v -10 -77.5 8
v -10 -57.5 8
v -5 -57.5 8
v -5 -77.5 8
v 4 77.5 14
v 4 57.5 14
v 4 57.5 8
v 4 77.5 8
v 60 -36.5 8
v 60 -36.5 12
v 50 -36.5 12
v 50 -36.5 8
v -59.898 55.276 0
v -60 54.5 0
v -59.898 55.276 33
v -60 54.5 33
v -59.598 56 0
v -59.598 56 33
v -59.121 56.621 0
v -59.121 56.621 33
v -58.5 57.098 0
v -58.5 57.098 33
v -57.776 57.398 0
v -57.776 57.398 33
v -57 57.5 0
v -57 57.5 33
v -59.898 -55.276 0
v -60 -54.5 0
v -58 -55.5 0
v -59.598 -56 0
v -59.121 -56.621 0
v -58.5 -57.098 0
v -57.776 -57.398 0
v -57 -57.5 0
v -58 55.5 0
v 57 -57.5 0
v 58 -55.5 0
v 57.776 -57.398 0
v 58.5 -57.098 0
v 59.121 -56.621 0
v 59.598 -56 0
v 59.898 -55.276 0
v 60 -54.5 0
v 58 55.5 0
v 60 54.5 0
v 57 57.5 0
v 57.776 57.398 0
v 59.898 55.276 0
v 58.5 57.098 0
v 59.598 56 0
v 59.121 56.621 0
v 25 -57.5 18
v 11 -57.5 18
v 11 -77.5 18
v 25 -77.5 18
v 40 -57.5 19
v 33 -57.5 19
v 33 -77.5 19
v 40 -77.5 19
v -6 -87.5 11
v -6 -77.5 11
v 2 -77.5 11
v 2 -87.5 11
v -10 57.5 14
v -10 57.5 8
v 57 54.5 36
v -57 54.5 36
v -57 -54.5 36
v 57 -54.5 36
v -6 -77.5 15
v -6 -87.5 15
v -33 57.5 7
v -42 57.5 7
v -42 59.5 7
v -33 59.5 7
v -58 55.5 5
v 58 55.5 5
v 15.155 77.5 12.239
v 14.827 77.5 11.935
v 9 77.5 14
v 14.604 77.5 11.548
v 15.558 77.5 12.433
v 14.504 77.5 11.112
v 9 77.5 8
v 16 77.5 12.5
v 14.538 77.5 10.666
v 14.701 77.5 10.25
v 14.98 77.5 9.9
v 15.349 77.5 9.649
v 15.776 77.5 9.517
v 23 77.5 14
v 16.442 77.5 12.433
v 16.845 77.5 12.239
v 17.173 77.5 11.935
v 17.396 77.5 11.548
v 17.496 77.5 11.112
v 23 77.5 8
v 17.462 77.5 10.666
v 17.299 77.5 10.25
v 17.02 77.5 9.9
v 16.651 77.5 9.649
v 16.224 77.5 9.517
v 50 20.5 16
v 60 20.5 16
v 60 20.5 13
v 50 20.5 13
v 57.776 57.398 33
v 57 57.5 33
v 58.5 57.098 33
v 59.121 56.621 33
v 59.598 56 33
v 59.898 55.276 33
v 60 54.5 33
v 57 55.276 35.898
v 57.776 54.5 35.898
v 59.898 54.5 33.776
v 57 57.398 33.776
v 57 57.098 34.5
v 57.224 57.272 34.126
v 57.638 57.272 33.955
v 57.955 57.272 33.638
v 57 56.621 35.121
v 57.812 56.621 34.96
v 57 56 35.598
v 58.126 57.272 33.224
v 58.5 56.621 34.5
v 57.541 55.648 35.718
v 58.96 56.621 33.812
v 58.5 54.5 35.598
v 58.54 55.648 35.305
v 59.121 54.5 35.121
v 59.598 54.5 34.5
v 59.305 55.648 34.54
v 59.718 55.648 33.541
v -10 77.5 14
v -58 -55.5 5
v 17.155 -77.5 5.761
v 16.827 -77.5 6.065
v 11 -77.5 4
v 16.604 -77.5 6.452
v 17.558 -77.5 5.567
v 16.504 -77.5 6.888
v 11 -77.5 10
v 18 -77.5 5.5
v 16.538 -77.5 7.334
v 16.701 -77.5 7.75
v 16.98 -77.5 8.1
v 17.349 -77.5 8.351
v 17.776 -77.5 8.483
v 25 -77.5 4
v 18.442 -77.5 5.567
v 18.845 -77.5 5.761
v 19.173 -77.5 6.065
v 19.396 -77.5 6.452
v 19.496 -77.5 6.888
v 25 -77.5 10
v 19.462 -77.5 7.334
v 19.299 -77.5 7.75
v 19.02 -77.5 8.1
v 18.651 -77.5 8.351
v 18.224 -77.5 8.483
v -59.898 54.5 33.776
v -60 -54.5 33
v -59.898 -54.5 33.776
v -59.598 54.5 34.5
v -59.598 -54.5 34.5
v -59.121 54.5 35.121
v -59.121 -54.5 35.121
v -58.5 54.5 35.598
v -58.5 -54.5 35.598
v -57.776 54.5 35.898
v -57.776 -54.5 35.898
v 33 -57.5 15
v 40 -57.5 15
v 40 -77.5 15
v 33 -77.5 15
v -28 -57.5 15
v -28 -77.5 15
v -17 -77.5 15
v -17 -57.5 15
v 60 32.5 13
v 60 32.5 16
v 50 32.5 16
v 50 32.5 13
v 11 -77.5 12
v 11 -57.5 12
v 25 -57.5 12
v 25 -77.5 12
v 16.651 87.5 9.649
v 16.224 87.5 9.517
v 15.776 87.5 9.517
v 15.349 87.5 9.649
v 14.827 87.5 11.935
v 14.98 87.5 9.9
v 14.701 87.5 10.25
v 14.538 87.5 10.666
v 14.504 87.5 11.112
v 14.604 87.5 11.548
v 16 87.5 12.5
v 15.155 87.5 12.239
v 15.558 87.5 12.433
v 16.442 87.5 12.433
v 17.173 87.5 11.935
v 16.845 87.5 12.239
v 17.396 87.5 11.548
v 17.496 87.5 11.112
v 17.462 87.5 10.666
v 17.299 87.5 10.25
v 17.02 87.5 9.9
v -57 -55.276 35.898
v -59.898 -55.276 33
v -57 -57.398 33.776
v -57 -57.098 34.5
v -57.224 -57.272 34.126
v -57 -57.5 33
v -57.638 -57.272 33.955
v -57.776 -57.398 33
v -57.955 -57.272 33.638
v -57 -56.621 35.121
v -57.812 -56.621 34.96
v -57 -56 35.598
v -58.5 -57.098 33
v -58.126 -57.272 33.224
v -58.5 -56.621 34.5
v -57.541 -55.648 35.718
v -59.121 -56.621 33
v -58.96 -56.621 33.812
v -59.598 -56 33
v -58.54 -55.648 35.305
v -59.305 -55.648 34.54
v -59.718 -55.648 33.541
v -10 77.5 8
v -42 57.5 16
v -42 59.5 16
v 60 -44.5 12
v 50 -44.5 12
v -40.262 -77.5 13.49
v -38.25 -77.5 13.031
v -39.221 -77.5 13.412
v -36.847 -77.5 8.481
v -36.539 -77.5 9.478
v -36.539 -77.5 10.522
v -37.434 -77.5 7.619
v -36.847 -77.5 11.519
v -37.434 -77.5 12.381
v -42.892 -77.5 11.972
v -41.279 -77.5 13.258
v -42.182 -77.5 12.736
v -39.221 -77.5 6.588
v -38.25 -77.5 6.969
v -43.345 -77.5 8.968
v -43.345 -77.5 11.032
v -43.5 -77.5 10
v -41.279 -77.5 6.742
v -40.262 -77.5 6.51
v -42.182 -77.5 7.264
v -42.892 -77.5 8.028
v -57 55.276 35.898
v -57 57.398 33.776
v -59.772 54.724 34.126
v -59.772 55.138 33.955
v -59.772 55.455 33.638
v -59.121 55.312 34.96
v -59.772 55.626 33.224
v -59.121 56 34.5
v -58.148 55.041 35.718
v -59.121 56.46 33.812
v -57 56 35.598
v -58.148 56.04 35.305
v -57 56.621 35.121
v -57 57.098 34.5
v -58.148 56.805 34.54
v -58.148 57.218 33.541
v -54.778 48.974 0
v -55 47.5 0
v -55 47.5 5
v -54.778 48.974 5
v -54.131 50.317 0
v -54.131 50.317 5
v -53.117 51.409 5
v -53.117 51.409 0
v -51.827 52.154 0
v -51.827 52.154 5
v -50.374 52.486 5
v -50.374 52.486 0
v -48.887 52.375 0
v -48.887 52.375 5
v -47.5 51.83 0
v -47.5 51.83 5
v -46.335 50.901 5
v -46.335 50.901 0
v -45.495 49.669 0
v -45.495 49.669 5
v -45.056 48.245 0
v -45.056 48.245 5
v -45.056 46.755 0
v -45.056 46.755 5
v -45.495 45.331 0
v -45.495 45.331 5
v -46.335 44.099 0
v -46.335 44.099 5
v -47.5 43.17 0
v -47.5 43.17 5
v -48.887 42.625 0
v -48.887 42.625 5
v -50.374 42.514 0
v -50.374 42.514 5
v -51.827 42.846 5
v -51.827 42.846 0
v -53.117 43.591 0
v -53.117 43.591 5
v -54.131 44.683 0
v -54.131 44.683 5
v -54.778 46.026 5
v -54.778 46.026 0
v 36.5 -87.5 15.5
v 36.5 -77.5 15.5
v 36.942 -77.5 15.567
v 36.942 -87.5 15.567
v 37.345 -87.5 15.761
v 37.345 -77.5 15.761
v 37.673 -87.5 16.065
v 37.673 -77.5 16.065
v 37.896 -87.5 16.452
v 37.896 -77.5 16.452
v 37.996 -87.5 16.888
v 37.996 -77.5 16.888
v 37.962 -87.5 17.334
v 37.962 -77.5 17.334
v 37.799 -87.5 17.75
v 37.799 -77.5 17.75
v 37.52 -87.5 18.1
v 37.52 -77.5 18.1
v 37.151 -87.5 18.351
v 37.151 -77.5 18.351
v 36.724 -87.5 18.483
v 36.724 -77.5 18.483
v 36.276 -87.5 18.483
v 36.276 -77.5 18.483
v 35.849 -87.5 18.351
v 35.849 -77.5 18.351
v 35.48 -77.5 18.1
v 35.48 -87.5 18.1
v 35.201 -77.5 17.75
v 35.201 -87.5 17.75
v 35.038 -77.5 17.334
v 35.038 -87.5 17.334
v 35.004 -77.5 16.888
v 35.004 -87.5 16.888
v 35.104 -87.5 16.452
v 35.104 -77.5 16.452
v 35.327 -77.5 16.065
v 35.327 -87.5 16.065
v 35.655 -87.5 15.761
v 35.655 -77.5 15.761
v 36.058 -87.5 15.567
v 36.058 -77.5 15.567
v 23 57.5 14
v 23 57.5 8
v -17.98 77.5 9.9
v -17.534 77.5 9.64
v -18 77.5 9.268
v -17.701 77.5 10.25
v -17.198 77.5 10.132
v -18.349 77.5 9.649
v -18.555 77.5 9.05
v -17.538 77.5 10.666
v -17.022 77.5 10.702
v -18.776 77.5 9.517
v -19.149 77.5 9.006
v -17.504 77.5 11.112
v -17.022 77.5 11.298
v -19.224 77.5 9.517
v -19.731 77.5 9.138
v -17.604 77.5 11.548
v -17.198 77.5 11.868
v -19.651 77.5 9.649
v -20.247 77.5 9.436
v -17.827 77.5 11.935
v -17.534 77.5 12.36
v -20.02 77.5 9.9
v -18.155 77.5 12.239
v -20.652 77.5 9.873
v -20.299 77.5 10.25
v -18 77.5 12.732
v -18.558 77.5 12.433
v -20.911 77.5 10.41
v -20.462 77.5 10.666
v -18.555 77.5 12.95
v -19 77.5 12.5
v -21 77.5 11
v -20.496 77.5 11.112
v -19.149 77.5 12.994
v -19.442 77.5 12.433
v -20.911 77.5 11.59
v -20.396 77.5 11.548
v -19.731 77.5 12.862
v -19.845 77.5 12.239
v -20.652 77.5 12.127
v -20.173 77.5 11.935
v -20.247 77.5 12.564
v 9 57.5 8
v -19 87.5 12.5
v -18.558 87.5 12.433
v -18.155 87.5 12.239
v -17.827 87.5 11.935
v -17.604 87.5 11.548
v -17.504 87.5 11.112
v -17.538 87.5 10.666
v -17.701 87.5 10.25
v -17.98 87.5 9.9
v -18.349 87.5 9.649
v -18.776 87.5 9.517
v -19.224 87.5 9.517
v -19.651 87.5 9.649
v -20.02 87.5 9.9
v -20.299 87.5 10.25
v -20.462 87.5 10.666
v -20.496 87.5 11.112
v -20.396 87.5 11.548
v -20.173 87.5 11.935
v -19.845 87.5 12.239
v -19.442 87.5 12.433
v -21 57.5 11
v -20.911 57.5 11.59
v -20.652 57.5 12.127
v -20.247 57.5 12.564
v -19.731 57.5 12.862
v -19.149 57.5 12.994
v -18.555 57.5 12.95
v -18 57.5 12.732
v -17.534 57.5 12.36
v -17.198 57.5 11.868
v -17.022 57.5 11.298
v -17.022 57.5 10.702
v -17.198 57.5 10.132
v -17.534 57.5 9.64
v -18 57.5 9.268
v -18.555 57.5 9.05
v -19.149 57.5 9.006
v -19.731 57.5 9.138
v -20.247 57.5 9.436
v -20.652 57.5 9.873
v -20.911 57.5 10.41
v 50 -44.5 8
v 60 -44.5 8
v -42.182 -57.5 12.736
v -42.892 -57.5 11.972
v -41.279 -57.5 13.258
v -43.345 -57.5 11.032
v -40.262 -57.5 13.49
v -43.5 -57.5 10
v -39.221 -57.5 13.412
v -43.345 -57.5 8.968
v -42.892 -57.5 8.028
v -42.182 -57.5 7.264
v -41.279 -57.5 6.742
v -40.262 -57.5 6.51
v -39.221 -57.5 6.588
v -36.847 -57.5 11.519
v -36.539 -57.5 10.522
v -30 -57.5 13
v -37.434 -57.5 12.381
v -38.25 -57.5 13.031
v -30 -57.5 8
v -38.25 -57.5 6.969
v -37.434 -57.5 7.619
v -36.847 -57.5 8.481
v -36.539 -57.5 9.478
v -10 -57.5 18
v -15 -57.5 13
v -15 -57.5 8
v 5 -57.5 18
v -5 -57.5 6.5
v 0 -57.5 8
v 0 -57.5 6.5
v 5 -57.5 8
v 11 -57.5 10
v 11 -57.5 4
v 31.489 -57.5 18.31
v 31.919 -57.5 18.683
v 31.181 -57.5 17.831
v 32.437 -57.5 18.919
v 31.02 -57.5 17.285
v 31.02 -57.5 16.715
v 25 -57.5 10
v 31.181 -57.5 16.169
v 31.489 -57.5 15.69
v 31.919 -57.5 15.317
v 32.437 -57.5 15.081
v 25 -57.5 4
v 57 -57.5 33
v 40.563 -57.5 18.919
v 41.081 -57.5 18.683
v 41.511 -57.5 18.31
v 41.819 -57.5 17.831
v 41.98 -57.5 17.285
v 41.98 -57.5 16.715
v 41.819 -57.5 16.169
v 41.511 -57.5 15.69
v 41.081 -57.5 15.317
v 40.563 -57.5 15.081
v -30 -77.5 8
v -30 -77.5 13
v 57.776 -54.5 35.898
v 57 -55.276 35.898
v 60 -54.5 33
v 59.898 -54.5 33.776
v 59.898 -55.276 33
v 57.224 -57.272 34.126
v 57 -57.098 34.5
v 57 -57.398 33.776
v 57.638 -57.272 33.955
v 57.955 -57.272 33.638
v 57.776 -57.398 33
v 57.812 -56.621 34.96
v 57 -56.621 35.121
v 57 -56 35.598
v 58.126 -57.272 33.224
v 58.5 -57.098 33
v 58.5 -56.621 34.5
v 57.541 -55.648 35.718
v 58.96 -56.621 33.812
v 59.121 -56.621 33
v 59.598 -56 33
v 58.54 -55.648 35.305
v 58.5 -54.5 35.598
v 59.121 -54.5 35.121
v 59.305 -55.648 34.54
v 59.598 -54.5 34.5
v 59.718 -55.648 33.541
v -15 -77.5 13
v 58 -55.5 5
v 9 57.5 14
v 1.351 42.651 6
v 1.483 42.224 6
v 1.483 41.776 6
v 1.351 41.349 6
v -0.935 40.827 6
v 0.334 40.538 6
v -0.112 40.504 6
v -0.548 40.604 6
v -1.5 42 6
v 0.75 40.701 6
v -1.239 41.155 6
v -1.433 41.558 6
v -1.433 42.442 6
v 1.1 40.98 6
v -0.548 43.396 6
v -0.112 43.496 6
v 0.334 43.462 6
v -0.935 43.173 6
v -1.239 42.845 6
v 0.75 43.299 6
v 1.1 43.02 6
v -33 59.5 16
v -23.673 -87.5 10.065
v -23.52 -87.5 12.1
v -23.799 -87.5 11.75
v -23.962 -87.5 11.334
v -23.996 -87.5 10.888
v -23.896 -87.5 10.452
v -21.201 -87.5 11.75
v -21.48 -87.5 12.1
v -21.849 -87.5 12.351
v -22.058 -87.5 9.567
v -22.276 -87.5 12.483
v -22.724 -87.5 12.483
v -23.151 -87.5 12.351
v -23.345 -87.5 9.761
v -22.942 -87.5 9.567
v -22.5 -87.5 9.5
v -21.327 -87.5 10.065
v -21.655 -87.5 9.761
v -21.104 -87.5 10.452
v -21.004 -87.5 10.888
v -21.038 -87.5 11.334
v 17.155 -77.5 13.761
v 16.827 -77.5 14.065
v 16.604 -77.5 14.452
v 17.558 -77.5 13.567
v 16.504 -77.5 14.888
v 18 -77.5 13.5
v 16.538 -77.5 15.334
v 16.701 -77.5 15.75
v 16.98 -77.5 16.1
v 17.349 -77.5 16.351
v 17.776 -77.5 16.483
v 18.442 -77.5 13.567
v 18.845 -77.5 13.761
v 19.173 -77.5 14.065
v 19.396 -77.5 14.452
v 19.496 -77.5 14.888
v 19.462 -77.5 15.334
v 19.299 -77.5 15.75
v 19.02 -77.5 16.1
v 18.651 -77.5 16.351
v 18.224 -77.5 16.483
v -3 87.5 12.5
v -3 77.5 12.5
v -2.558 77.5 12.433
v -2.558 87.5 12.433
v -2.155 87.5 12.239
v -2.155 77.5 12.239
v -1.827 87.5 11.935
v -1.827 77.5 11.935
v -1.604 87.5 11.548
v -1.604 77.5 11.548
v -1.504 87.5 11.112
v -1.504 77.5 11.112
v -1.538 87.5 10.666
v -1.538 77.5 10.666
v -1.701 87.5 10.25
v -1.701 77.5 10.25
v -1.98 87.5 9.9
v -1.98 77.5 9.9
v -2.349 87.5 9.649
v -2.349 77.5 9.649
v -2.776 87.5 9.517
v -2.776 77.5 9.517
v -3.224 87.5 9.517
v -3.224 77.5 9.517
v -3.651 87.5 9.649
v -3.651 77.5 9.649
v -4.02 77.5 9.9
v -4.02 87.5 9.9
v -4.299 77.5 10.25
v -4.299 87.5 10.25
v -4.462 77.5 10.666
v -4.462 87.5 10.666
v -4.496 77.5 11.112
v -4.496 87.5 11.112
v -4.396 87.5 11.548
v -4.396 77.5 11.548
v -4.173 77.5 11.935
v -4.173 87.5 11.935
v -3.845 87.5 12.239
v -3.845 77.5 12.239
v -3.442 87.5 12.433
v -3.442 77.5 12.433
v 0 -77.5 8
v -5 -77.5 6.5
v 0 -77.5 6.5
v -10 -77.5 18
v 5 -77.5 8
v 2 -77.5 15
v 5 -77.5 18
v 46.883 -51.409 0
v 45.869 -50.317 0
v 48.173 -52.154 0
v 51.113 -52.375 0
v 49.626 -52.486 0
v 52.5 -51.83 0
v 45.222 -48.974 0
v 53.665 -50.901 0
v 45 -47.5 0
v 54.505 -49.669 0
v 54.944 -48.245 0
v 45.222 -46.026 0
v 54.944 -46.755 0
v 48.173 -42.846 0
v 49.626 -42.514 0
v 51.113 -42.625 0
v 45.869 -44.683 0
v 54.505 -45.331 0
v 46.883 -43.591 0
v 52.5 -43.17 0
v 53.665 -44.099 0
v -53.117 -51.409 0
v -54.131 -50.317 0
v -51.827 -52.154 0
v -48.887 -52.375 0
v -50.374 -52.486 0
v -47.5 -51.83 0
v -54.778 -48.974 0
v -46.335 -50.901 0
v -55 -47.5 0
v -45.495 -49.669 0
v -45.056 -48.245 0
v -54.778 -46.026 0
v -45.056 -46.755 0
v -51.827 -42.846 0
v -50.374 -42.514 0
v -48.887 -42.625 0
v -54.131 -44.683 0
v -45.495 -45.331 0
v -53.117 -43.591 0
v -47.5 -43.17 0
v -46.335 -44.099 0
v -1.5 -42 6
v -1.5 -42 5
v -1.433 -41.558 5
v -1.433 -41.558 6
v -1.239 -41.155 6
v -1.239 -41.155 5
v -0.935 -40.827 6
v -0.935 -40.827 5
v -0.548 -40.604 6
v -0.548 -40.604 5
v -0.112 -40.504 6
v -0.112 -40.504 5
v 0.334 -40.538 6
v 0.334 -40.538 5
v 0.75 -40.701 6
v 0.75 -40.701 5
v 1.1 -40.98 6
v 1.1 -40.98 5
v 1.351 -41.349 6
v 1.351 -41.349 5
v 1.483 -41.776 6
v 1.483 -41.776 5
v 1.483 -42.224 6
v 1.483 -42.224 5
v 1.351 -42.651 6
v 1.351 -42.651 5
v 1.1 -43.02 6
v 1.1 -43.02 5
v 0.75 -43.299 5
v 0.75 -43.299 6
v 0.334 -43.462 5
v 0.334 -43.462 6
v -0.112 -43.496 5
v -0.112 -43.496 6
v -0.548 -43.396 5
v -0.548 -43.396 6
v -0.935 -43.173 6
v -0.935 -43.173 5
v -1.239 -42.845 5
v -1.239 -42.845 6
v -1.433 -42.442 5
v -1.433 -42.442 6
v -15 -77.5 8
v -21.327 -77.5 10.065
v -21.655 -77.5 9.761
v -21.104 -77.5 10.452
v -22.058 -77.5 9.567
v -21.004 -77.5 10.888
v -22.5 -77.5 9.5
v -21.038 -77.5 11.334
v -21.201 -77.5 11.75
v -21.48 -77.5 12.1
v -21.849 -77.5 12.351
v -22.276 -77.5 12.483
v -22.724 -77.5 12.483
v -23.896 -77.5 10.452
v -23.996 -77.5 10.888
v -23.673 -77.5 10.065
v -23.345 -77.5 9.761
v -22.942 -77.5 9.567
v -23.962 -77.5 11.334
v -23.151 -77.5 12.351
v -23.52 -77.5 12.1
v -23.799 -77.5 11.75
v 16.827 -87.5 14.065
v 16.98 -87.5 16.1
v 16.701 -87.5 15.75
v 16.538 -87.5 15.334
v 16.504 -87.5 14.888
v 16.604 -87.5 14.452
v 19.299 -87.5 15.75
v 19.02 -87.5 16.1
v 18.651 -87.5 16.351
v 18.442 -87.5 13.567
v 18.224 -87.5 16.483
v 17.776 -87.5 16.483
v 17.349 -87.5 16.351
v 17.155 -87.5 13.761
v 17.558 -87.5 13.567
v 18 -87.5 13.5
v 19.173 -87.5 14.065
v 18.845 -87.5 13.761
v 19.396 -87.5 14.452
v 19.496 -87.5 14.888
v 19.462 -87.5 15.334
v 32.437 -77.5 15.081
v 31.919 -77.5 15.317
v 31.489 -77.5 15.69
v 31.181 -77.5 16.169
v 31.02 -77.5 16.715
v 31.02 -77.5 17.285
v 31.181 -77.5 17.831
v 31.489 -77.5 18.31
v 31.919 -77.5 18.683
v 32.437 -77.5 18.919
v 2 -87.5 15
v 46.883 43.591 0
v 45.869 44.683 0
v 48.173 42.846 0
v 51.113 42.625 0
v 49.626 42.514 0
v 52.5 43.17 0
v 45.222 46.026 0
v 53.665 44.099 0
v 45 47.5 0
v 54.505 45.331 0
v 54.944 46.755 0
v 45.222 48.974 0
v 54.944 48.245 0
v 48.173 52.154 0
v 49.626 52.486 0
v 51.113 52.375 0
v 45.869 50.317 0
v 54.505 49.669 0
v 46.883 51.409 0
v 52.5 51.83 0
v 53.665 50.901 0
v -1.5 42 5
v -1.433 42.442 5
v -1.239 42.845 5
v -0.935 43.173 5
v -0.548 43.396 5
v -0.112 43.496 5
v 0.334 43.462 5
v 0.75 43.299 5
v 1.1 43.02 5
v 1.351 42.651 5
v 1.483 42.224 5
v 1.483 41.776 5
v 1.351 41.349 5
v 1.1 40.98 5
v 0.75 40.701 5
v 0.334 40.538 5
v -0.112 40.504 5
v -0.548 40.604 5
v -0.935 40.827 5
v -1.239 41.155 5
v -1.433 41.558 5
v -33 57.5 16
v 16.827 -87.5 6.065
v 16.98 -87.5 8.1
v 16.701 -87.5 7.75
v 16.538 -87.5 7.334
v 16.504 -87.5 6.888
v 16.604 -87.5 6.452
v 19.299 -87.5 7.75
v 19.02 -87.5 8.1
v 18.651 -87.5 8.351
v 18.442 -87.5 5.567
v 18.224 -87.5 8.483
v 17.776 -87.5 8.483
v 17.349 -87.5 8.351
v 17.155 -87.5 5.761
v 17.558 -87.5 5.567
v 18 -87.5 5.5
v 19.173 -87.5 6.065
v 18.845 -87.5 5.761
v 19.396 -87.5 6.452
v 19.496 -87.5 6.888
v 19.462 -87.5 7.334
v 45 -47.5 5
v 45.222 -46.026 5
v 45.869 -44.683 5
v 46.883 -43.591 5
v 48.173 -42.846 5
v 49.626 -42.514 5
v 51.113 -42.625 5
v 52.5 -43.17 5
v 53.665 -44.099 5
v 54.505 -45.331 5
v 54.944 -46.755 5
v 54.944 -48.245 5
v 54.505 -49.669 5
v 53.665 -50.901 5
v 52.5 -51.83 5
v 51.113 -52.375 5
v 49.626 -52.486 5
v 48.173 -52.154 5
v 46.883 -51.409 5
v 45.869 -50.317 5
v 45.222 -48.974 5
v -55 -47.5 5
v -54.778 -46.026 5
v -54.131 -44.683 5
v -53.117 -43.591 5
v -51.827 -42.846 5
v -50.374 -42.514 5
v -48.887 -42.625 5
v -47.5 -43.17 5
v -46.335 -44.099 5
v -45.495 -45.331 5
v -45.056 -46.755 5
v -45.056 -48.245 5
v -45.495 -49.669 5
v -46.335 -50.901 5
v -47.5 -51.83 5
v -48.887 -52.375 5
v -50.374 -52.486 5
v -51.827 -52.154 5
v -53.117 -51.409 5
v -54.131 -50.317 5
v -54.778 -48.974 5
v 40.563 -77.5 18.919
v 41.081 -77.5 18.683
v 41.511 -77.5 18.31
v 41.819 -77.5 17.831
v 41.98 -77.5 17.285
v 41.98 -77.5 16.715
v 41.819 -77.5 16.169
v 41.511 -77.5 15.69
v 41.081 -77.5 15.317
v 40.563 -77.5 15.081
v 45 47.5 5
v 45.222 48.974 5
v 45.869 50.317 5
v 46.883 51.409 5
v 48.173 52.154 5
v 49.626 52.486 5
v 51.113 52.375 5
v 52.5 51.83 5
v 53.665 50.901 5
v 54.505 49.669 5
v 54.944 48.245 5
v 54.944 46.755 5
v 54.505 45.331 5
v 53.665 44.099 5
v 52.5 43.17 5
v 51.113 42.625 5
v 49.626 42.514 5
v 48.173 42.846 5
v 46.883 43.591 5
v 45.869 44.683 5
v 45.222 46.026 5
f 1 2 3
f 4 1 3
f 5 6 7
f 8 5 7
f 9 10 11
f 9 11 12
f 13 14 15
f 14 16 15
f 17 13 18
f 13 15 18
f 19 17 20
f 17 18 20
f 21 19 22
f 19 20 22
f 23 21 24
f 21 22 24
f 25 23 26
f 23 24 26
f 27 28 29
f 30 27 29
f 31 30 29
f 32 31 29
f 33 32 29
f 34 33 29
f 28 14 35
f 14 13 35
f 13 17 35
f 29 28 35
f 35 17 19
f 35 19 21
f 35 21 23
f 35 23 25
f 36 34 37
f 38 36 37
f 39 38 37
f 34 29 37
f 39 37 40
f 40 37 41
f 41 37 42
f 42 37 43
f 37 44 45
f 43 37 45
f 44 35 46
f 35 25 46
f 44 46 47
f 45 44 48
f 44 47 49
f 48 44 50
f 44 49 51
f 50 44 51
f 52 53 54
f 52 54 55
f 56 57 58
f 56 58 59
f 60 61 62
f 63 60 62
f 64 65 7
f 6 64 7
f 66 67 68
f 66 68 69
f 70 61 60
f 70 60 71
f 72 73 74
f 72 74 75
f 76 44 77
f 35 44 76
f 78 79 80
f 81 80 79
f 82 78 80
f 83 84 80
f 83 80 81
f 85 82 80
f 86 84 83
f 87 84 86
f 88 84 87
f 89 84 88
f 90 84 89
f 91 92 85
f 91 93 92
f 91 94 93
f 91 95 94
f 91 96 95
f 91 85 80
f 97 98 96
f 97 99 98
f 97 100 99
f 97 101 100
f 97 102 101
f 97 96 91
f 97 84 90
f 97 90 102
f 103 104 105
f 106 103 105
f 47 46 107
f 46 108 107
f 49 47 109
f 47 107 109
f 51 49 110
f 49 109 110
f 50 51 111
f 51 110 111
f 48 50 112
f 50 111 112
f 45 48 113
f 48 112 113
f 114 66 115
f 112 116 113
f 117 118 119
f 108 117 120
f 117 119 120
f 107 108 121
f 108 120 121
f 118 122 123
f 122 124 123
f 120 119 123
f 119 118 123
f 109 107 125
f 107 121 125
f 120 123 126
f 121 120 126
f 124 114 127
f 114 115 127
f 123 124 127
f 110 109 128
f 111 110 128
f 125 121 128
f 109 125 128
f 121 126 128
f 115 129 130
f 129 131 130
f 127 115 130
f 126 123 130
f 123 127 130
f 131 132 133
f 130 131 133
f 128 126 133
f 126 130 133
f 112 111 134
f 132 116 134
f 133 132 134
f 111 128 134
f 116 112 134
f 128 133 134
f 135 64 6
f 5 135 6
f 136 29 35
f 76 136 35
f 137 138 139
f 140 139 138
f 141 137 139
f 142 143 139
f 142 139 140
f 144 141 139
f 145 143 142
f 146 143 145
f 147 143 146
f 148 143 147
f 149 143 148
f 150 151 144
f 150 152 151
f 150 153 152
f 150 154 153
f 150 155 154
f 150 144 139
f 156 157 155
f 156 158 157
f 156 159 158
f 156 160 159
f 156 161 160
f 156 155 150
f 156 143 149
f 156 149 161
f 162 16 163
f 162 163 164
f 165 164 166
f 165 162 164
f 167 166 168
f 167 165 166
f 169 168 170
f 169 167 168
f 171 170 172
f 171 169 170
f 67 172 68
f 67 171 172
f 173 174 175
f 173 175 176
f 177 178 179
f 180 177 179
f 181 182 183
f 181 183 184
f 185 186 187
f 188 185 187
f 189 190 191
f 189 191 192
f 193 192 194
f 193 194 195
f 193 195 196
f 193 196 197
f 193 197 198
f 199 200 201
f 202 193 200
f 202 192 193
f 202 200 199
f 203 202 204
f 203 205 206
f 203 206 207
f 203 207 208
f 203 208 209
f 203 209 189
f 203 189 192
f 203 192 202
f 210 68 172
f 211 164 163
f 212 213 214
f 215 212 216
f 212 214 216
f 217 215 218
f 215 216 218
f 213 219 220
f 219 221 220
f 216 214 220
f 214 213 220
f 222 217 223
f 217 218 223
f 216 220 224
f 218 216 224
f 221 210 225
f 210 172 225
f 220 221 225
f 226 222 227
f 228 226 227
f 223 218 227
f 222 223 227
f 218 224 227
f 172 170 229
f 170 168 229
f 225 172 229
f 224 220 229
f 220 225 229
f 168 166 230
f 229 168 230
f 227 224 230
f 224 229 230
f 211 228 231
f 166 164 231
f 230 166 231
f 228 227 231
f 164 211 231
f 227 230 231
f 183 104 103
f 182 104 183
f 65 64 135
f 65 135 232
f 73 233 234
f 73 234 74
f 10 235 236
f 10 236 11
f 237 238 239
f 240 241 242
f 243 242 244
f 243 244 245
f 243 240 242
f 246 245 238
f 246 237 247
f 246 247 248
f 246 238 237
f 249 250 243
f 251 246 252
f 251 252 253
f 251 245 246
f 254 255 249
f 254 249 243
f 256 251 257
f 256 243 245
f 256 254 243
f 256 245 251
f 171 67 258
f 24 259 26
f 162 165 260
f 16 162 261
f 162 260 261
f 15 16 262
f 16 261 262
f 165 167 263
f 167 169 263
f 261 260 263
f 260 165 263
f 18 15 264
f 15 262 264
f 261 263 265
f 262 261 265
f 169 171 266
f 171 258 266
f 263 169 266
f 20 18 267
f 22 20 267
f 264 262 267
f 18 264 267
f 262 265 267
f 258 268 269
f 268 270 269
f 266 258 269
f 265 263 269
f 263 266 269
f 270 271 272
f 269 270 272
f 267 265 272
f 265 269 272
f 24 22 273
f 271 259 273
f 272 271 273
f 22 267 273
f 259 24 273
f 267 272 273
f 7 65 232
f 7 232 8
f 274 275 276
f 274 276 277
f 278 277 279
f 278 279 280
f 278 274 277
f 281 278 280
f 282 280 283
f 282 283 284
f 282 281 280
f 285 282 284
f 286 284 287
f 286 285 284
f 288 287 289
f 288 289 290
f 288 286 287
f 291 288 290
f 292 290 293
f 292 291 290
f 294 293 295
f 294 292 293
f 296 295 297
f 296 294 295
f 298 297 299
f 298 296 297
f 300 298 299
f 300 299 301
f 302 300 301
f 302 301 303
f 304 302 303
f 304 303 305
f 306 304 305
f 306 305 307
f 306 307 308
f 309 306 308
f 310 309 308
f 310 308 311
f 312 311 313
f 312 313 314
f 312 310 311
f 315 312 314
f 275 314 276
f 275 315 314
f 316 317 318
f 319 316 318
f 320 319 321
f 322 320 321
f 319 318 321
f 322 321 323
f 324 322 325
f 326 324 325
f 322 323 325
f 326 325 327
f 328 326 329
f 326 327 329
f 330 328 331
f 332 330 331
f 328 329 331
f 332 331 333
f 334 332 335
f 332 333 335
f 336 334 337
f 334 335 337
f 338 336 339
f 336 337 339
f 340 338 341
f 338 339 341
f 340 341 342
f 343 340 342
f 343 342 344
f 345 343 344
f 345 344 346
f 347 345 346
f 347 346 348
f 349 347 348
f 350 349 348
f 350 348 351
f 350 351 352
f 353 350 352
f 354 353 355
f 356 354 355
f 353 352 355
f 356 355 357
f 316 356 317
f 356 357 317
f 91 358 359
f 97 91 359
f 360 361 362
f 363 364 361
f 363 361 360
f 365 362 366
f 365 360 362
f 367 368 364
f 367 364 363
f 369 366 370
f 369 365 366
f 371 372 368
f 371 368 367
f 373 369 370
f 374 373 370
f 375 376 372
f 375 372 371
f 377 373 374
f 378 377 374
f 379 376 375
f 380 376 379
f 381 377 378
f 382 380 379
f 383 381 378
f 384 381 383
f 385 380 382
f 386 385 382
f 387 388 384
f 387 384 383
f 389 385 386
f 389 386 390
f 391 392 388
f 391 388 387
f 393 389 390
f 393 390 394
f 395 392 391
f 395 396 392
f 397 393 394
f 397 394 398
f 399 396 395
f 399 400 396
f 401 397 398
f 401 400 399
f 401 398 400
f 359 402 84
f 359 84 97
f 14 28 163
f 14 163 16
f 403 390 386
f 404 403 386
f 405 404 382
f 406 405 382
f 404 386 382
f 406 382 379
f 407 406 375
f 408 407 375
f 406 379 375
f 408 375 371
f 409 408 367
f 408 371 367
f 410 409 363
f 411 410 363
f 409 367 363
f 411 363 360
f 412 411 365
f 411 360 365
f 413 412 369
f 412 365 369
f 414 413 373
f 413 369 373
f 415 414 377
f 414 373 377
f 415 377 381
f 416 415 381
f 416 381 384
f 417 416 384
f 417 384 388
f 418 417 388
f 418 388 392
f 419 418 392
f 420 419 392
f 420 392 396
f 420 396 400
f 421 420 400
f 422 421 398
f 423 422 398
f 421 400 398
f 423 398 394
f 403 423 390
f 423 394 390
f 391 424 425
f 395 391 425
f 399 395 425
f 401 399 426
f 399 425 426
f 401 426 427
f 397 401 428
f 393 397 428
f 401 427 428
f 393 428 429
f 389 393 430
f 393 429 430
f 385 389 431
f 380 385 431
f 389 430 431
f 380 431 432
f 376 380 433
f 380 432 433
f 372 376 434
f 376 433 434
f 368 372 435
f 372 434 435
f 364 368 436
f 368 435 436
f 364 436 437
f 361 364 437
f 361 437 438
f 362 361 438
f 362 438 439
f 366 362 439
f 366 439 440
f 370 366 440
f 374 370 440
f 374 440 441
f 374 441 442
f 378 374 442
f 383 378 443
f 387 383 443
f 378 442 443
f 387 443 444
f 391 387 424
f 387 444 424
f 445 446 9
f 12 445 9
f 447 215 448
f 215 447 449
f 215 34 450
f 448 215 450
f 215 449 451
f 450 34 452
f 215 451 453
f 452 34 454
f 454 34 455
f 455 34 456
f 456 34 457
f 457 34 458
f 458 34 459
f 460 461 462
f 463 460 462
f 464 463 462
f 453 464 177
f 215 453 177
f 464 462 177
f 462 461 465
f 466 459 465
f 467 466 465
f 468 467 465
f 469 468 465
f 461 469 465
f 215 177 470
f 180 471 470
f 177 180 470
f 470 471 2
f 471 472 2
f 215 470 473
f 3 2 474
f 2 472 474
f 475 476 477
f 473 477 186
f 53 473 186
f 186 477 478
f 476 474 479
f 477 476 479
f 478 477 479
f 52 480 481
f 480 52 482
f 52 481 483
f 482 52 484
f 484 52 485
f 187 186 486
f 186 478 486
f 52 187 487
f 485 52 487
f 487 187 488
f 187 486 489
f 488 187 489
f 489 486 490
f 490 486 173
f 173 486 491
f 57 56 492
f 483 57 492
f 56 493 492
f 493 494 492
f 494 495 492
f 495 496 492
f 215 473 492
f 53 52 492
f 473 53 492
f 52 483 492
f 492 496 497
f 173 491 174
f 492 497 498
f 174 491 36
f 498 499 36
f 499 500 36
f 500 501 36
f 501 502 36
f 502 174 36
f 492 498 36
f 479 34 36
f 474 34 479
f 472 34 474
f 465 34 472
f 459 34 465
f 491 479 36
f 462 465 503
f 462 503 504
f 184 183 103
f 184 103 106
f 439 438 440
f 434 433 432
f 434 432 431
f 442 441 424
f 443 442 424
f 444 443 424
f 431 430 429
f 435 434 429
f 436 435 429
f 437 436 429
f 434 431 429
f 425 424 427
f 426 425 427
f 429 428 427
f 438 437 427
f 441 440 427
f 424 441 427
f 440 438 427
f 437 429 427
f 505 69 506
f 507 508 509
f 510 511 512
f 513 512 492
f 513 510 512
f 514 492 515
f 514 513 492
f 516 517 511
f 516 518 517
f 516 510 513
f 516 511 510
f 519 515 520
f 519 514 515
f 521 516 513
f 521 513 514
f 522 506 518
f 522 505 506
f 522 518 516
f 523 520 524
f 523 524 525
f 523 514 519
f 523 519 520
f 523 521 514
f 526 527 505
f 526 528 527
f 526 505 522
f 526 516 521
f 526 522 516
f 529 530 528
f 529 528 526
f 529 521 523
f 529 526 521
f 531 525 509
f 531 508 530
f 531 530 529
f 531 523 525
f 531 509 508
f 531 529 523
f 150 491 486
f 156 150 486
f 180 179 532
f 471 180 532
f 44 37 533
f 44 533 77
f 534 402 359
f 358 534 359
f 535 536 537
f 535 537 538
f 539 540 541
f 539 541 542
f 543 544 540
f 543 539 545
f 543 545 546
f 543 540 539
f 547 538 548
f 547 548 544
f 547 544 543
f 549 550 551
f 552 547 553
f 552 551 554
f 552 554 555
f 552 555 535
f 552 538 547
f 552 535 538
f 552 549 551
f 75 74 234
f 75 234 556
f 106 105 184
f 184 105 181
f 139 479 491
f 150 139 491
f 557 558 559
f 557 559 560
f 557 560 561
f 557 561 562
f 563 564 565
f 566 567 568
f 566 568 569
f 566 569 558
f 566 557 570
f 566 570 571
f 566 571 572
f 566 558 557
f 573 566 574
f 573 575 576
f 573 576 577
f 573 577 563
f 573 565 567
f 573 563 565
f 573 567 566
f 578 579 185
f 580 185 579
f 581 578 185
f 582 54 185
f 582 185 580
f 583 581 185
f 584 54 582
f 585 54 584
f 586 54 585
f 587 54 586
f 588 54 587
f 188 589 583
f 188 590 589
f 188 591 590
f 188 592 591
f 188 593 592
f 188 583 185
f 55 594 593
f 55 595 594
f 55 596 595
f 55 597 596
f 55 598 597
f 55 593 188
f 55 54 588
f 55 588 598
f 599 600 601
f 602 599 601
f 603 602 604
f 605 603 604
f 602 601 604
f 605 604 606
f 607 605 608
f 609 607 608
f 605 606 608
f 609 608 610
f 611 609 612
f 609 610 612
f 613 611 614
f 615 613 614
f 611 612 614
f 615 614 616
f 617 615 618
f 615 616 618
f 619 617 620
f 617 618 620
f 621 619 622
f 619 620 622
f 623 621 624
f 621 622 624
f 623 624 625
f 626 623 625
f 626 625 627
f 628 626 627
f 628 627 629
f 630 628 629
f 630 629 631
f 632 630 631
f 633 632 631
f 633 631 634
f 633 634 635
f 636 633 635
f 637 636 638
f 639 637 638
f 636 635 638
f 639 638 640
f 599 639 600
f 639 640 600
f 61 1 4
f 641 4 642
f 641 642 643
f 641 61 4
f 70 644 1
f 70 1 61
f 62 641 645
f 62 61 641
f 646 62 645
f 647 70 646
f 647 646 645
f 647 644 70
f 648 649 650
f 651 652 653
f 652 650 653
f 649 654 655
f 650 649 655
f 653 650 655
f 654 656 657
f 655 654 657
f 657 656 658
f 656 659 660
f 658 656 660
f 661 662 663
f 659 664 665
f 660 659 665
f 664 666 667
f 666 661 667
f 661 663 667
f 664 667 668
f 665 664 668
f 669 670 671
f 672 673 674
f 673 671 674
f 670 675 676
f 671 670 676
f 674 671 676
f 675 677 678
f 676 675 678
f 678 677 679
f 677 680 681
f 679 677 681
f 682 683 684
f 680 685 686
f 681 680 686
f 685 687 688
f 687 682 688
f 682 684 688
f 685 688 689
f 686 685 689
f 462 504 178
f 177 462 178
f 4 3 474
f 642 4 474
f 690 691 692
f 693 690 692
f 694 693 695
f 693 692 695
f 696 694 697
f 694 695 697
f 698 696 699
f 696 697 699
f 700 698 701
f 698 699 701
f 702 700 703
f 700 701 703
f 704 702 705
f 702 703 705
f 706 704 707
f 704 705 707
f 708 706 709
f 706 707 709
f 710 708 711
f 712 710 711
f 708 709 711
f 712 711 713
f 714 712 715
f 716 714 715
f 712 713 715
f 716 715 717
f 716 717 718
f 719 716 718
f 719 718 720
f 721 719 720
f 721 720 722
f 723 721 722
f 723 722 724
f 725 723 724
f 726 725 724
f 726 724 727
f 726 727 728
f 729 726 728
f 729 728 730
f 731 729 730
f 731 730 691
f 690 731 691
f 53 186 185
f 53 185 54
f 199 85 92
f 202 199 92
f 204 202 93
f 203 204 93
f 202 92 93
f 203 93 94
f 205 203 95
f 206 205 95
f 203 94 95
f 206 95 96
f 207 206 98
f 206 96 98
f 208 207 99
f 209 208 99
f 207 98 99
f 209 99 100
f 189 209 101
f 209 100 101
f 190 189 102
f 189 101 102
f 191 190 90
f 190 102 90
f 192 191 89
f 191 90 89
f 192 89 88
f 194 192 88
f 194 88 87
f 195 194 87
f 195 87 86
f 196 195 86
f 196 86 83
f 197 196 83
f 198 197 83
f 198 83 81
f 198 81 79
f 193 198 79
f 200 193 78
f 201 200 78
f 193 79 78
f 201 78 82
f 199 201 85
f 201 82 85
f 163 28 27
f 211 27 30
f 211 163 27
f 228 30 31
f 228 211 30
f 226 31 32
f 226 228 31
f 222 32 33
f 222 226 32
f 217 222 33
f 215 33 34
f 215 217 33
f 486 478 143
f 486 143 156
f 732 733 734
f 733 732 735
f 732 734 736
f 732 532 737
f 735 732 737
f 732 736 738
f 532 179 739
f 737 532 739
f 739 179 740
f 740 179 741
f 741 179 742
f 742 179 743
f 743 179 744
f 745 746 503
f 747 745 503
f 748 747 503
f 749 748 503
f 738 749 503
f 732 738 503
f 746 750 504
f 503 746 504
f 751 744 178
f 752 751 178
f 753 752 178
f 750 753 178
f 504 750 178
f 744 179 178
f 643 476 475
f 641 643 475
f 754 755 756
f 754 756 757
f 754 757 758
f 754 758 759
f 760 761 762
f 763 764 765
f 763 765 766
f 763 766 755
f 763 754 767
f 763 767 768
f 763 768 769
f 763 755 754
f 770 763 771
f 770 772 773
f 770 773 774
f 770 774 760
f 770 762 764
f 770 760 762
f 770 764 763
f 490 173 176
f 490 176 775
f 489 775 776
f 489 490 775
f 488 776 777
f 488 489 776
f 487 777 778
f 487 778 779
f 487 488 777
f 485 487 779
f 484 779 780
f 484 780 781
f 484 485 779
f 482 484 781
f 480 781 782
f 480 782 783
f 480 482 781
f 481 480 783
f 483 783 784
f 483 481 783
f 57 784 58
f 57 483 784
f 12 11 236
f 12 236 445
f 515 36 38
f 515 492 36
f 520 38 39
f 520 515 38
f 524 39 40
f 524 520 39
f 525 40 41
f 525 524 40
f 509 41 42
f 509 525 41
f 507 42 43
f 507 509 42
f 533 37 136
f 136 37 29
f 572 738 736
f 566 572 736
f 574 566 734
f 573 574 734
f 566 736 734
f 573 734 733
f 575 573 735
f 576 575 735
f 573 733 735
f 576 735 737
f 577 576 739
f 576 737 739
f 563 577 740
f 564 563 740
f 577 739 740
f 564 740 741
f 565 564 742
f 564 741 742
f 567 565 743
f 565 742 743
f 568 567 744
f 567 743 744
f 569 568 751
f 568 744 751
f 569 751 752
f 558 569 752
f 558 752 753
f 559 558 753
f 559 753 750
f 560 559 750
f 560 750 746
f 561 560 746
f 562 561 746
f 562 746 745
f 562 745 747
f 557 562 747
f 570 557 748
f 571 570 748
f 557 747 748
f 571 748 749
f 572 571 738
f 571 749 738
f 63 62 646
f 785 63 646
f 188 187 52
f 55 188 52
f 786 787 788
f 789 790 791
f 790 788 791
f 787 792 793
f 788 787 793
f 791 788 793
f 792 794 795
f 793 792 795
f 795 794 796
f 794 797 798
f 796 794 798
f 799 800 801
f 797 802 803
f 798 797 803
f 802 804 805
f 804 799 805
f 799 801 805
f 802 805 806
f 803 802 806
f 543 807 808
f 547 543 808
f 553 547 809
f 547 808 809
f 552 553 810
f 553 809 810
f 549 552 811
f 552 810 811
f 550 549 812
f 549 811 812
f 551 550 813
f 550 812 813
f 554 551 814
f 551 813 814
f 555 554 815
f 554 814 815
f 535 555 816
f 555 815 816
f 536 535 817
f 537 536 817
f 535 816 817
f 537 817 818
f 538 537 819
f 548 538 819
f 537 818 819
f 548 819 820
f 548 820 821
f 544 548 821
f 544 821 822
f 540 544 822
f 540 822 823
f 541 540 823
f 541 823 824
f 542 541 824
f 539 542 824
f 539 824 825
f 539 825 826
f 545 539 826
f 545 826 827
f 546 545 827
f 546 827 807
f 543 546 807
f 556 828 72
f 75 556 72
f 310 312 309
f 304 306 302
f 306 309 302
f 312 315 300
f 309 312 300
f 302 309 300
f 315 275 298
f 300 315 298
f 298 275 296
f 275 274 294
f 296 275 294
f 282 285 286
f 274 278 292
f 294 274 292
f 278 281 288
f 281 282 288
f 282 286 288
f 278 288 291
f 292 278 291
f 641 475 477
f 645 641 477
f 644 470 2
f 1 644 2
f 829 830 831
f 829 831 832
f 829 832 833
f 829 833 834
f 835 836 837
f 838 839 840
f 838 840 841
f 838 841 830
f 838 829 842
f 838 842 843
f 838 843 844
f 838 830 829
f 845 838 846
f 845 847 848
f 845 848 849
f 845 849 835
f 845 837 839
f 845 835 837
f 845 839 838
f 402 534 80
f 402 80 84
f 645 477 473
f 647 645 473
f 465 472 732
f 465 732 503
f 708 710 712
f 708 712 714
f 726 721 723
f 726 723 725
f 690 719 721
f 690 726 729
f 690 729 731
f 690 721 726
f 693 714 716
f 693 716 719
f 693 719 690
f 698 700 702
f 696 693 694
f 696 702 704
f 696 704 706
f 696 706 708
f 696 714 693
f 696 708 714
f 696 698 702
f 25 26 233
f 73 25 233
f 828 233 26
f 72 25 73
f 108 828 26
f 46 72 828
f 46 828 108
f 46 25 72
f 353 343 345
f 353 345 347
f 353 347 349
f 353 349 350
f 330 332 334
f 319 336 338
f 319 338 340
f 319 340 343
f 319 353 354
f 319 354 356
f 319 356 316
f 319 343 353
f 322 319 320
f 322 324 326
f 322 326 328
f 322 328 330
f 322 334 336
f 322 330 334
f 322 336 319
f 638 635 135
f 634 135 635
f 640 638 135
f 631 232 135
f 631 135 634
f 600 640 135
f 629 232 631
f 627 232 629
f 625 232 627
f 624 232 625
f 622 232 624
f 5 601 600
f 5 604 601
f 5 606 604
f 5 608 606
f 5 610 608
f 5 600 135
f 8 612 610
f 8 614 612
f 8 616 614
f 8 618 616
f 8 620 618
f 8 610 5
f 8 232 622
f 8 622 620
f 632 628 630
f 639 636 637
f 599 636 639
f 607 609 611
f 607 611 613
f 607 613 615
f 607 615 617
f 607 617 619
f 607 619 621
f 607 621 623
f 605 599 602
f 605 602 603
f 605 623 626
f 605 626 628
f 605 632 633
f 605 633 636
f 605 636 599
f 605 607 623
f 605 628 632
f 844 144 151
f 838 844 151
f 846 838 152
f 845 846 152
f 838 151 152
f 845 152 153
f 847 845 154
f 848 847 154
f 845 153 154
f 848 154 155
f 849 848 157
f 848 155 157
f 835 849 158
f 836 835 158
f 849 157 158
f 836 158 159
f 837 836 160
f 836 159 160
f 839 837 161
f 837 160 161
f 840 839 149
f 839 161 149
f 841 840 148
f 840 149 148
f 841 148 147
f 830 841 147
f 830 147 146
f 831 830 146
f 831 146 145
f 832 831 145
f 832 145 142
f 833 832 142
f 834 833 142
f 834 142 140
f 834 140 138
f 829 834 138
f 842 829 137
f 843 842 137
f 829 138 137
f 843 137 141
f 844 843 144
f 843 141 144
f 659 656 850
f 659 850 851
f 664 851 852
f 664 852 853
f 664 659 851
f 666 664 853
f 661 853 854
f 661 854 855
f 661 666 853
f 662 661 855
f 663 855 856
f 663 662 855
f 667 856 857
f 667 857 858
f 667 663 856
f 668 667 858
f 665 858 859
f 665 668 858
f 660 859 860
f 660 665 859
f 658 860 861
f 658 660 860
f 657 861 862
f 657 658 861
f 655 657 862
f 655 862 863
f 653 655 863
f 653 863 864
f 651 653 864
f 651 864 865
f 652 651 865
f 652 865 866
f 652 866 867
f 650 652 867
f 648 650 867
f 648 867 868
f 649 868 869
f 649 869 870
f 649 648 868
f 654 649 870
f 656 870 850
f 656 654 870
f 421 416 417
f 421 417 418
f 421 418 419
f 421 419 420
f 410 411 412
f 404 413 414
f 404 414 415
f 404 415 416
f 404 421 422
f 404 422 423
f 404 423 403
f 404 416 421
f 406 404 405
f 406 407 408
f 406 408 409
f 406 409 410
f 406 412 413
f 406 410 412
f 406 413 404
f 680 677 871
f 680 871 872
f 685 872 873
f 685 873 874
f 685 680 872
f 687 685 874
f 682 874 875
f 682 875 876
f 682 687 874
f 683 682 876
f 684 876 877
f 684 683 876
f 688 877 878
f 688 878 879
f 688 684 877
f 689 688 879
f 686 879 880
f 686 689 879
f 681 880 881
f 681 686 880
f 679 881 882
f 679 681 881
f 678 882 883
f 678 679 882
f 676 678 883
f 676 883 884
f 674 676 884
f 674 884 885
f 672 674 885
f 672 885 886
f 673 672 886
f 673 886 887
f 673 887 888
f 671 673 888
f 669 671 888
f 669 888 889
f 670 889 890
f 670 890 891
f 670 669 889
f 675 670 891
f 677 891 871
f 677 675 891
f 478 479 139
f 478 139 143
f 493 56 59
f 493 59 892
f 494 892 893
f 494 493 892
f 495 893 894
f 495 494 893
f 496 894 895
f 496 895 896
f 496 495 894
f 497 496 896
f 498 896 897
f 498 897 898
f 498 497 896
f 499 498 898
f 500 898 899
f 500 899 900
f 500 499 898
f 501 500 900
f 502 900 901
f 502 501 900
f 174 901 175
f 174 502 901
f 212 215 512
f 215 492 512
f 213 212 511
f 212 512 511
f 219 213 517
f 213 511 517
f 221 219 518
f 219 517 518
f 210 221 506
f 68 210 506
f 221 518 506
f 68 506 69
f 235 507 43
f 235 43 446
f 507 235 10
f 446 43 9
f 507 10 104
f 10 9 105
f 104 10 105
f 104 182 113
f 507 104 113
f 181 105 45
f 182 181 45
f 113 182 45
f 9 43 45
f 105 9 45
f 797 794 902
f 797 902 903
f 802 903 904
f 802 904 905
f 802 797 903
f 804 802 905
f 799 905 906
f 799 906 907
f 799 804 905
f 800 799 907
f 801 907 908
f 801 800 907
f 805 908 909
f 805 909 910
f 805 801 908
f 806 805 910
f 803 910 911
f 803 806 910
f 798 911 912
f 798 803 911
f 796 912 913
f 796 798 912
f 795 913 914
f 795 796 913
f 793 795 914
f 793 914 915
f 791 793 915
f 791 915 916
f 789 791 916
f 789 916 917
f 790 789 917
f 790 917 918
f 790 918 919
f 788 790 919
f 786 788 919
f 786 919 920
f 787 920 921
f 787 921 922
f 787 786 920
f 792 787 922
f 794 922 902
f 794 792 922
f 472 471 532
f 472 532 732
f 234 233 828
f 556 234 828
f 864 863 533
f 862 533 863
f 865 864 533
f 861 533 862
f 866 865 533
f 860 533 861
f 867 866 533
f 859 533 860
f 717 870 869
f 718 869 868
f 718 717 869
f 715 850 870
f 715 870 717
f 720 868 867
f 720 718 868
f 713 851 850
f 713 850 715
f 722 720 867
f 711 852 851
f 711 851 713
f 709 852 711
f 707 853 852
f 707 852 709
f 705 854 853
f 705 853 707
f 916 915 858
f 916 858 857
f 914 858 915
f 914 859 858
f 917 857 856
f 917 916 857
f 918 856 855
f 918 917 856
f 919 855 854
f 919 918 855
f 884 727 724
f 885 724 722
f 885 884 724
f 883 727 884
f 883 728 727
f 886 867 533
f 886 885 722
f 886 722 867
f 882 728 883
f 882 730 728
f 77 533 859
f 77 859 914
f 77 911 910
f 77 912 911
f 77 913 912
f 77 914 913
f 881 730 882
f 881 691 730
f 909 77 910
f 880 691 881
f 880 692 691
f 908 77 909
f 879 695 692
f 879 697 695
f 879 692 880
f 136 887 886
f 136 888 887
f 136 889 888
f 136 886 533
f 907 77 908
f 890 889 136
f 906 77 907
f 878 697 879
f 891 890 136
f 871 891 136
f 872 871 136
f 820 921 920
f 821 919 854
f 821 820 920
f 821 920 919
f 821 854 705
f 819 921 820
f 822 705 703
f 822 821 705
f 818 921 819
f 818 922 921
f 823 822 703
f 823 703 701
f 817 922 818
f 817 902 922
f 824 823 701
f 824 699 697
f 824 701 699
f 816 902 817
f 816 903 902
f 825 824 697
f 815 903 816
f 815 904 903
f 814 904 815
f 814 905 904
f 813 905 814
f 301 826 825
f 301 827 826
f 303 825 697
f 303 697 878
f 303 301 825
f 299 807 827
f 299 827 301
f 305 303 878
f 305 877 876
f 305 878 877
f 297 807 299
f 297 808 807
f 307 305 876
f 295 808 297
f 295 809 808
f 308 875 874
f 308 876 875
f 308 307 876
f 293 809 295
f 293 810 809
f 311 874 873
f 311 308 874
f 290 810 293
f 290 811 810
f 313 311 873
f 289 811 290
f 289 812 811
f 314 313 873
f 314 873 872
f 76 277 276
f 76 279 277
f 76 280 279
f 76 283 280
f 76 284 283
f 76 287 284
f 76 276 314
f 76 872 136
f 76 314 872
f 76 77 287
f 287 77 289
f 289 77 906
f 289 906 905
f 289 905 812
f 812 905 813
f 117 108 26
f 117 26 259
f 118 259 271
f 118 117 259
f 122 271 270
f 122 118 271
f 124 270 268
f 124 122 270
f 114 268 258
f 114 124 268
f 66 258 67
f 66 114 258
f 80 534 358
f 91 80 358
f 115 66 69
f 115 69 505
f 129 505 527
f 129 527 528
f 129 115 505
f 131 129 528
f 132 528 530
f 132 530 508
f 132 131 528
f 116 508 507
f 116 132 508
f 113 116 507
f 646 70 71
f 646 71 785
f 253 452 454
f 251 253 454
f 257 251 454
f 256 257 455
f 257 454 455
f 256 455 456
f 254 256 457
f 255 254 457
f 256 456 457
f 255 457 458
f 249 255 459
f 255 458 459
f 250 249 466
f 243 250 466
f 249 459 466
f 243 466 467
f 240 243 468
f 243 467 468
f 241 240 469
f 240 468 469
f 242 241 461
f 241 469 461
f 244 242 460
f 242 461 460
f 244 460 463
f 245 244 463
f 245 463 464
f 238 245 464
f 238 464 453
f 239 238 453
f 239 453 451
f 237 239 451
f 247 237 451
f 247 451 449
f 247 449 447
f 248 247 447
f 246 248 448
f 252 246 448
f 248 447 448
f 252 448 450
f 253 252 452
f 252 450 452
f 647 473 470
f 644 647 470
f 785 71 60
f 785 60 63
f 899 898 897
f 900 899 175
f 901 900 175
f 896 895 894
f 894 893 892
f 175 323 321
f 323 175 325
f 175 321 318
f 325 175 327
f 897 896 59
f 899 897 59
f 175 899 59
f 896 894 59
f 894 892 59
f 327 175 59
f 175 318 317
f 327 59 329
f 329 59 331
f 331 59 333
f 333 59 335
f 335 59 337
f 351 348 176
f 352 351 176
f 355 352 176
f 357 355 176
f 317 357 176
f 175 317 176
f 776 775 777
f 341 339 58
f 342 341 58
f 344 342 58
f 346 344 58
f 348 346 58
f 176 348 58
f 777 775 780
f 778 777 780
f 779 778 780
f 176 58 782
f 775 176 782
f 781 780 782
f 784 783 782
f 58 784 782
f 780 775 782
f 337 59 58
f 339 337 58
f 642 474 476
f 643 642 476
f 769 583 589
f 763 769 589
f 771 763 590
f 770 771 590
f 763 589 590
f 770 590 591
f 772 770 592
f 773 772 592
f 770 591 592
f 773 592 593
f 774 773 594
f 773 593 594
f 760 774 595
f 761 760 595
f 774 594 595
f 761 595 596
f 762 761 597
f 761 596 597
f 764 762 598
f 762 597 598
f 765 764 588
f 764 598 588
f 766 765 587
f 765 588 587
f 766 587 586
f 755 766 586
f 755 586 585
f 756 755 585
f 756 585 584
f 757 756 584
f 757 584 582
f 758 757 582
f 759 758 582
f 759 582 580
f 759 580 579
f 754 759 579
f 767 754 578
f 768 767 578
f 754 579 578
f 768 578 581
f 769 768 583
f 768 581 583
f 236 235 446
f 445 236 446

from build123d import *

# Parameters (mm, degrees)
SKETCH_1_W          = 120
SKETCH_1_H          = 115
EXTRUDE_1_DEPTH     = 36
SKETCH_2_R          = 1.5
CUT_EXTRUDE_1_DEPTH = 6
FILLET_1_R          = 3
SKETCH_3_R          = 3.5
SKETCH_3_W          = 14
SKETCH_3_H          = 6
EXTRUDE_2_DEPTH     = 20
SKETCH_4_R          = 1.5
SKETCH_4_W          = 8
SKETCH_4_H          = 4
EXTRUDE_3_DEPTH     = 10
SKETCH_5_W          = 3
SKETCH_5_H          = 12
SKETCH_5_W_2        = 4
SKETCH_5_H_2        = 8
CUT_EXTRUDE_2_DEPTH = 10
SKETCH_6_W          = 9
SKETCH_6_H          = 9
EXTRUDE_4_DEPTH     = 2
SKETCH_7_R          = 2
EXTRUDE_5_DEPTH     = 20
SKETCH_7_W          = 14
SKETCH_7_H          = 6
EXTRUDE_5_2_DEPTH   = 20
EXTRUDE_5_3_DEPTH   = 20
SKETCH_9_R          = 1.5
EXTRUDE_6_DEPTH     = 10
SKETCH_10_W         = 116
SKETCH_10_H         = 111
SKETCH_10_R         = 5
SKETCH_10_R_2       = 1.5
CUT_EXTRUDE_3_DEPTH = 5


with BuildPart() as part:
    # 草图1 → 凸台-拉伸1 (new body)
    with BuildSketch(Plane.XY):
        Rectangle(SKETCH_1_W, SKETCH_1_H)
    extrude(amount=EXTRUDE_1_DEPTH)

    # 草图2 → 切除-拉伸1 (cut)
    with BuildSketch(Plane(origin=(0, 0, 0), x_dir=(-1, 0, 0), z_dir=(0, 0, -1))):
        with Locations((0, 42)):
            Circle(SKETCH_2_R)
        with Locations((0, -42)):
            Circle(SKETCH_2_R)
    extrude(amount=-CUT_EXTRUDE_1_DEPTH, mode=Mode.SUBTRACT)

    # 圆角1
    fillet_1_edges = [part.edges().sort_by_distance(p)[0] for p in [
        (60, 0, 36),
        (0, 57.5, 36),
        (-60, 0, 36),
        (0, -57.5, 36),
        (-60, 57.5, 18),
        (60, 57.5, 18),
        (60, -57.5, 18),
        (-60, -57.5, 18),
    ]]
    fillet(fillet_1_edges, radius=FILLET_1_R)

    # 草图3 → 凸台-拉伸2 (add)
    with BuildSketch(Plane.XZ.offset(57.5)):
        with Locations(Location((-40, 10, 0), (0, 0, 180))):
            Circle(SKETCH_3_R)
        Polygon((-30, 13), (-28, 15), (-17, 15), (-15, 13), (-15, 8), (-30, 8), align=None)
        Polygon((0, 8), (5, 8), (5, 18), (-10, 18), (-10, 8), (-5, 8), (-5, 6.5), (0, 6.5), align=None)
        with Locations((18, 15)):
            Rectangle(SKETCH_3_W, SKETCH_3_H)
        with Locations((18, 7)):
            Rectangle(SKETCH_3_W, SKETCH_3_H)
        with BuildLine():
            Line((33, 19), (40, 19))
            ThreePointArc((40, 19), (42, 17), (40, 15))
            Line((40, 15), (33, 15))
            ThreePointArc((33, 15), (31, 17), (33, 19))
        make_face()
    extrude(amount=EXTRUDE_2_DEPTH)

    # 草图4 → 凸台-拉伸3 (add)
    with BuildSketch(Plane.XZ.offset(77.5)):
        with Locations(Location((-22.5, 11, 0), (0, 0, 270))):
            Circle(SKETCH_4_R)
        with Locations(Location((18, 15, 0), (0, 0, 270))):
            Circle(SKETCH_4_R)
        with Locations(Location((18, 7, 0), (0, 0, 270))):
            Circle(SKETCH_4_R)
        with Locations(Location((36.5, 17, 0), (0, 0, 270))):
            Circle(SKETCH_4_R)
        with Locations((-2, 13)):
            Rectangle(SKETCH_4_W, SKETCH_4_H)
    extrude(amount=EXTRUDE_3_DEPTH)

    # 草图5 → 切除-拉伸2 (cut)
    with BuildSketch(Plane(origin=(60, 0, 0), x_dir=(0, 0, -1), z_dir=(1, 0, 0))):
        with Locations((-14.5, 26.5)):
            Rectangle(SKETCH_5_W, SKETCH_5_H)
        with Locations((-10, -40.5)):
            Rectangle(SKETCH_5_W_2, SKETCH_5_H_2)
    extrude(amount=-CUT_EXTRUDE_2_DEPTH, mode=Mode.SUBTRACT)

    # 草图6 → 凸台-拉伸4 (add)
    with BuildSketch(Plane(origin=(0, 57.5, 0), x_dir=(1, 0, 0), z_dir=(0, 1, 0))):
        with Locations((-37.5, -11.5)):
            Rectangle(SKETCH_6_W, SKETCH_6_H)
    extrude(amount=EXTRUDE_4_DEPTH)

    # 草图10 → 切除-拉伸3 (cut)
    with BuildSketch(Plane(origin=(0, 0, 0), x_dir=(-1, 0, 0), z_dir=(0, 0, -1))):
        Rectangle(SKETCH_10_W, SKETCH_10_H)
        with Locations((50, -47.5)):
            Circle(SKETCH_10_R, mode=Mode.SUBTRACT)
        with Locations((-50, -47.5)):
            Circle(SKETCH_10_R, mode=Mode.SUBTRACT)
        with Locations((50, 47.5)):
            Circle(SKETCH_10_R, mode=Mode.SUBTRACT)
        with Locations((-50, 47.5)):
            Circle(SKETCH_10_R, mode=Mode.SUBTRACT)
        with Locations((0, -42)):
            Circle(SKETCH_10_R_2, mode=Mode.SUBTRACT)
        with Locations((0, 42)):
            Circle(SKETCH_10_R_2, mode=Mode.SUBTRACT)
    extrude(amount=-CUT_EXTRUDE_3_DEPTH, mode=Mode.SUBTRACT)


with BuildPart() as body_2:
    # 草图7 → 凸台-拉伸5 (new body)
    with BuildSketch(Plane(origin=(0, 57.5, 0), x_dir=(1, 0, 0), z_dir=(0, 1, 0))):
        with Locations(Location((-19, -11, 0), (0, 0, 180))):
            Circle(SKETCH_7_R)
    extrude(amount=EXTRUDE_5_DEPTH)



with BuildPart() as body_3:
    # 草图7 → Extrude 5 2 (new body)
    with BuildSketch(Plane(origin=(0, 57.5, 0), x_dir=(1, 0, 0), z_dir=(0, 1, 0))):
        with Locations((-3, -11)):
            Rectangle(SKETCH_7_W, SKETCH_7_H)
    extrude(amount=EXTRUDE_5_2_DEPTH)


with BuildPart() as body_4:
    # 草图7 → Extrude 5 3 (new body)
    with BuildSketch(Plane(origin=(0, 57.5, 0), x_dir=(1, 0, 0), z_dir=(0, 1, 0))):
        with Locations((16, -11)):
            Rectangle(SKETCH_7_W, SKETCH_7_H)
    extrude(amount=EXTRUDE_5_3_DEPTH)


with BuildPart() as body_2_1:
    add(body_2.part)

    add(body_3.part)  # 凸台-拉伸6 merges body 3

    add(body_4.part)  # 凸台-拉伸6 merges body 4
    # 草图9 → 凸台-拉伸6 (add)
    with BuildSketch(Plane(origin=(0, 77.5, 0), x_dir=(1, 0, 0), z_dir=(0, 1, 0))):
        with Locations(Location((-3, -11, 0), (0, 0, 270))):
            Circle(SKETCH_9_R)
        with Locations(Location((16, -11, 0), (0, 0, 270))):
            Circle(SKETCH_9_R)
        with Locations(Location((-19, -11, 0), (0, 0, 270))):
            Circle(SKETCH_9_R)
    extrude(amount=EXTRUDE_6_DEPTH)


solid = Compound([part.part, body_2_1.part])
